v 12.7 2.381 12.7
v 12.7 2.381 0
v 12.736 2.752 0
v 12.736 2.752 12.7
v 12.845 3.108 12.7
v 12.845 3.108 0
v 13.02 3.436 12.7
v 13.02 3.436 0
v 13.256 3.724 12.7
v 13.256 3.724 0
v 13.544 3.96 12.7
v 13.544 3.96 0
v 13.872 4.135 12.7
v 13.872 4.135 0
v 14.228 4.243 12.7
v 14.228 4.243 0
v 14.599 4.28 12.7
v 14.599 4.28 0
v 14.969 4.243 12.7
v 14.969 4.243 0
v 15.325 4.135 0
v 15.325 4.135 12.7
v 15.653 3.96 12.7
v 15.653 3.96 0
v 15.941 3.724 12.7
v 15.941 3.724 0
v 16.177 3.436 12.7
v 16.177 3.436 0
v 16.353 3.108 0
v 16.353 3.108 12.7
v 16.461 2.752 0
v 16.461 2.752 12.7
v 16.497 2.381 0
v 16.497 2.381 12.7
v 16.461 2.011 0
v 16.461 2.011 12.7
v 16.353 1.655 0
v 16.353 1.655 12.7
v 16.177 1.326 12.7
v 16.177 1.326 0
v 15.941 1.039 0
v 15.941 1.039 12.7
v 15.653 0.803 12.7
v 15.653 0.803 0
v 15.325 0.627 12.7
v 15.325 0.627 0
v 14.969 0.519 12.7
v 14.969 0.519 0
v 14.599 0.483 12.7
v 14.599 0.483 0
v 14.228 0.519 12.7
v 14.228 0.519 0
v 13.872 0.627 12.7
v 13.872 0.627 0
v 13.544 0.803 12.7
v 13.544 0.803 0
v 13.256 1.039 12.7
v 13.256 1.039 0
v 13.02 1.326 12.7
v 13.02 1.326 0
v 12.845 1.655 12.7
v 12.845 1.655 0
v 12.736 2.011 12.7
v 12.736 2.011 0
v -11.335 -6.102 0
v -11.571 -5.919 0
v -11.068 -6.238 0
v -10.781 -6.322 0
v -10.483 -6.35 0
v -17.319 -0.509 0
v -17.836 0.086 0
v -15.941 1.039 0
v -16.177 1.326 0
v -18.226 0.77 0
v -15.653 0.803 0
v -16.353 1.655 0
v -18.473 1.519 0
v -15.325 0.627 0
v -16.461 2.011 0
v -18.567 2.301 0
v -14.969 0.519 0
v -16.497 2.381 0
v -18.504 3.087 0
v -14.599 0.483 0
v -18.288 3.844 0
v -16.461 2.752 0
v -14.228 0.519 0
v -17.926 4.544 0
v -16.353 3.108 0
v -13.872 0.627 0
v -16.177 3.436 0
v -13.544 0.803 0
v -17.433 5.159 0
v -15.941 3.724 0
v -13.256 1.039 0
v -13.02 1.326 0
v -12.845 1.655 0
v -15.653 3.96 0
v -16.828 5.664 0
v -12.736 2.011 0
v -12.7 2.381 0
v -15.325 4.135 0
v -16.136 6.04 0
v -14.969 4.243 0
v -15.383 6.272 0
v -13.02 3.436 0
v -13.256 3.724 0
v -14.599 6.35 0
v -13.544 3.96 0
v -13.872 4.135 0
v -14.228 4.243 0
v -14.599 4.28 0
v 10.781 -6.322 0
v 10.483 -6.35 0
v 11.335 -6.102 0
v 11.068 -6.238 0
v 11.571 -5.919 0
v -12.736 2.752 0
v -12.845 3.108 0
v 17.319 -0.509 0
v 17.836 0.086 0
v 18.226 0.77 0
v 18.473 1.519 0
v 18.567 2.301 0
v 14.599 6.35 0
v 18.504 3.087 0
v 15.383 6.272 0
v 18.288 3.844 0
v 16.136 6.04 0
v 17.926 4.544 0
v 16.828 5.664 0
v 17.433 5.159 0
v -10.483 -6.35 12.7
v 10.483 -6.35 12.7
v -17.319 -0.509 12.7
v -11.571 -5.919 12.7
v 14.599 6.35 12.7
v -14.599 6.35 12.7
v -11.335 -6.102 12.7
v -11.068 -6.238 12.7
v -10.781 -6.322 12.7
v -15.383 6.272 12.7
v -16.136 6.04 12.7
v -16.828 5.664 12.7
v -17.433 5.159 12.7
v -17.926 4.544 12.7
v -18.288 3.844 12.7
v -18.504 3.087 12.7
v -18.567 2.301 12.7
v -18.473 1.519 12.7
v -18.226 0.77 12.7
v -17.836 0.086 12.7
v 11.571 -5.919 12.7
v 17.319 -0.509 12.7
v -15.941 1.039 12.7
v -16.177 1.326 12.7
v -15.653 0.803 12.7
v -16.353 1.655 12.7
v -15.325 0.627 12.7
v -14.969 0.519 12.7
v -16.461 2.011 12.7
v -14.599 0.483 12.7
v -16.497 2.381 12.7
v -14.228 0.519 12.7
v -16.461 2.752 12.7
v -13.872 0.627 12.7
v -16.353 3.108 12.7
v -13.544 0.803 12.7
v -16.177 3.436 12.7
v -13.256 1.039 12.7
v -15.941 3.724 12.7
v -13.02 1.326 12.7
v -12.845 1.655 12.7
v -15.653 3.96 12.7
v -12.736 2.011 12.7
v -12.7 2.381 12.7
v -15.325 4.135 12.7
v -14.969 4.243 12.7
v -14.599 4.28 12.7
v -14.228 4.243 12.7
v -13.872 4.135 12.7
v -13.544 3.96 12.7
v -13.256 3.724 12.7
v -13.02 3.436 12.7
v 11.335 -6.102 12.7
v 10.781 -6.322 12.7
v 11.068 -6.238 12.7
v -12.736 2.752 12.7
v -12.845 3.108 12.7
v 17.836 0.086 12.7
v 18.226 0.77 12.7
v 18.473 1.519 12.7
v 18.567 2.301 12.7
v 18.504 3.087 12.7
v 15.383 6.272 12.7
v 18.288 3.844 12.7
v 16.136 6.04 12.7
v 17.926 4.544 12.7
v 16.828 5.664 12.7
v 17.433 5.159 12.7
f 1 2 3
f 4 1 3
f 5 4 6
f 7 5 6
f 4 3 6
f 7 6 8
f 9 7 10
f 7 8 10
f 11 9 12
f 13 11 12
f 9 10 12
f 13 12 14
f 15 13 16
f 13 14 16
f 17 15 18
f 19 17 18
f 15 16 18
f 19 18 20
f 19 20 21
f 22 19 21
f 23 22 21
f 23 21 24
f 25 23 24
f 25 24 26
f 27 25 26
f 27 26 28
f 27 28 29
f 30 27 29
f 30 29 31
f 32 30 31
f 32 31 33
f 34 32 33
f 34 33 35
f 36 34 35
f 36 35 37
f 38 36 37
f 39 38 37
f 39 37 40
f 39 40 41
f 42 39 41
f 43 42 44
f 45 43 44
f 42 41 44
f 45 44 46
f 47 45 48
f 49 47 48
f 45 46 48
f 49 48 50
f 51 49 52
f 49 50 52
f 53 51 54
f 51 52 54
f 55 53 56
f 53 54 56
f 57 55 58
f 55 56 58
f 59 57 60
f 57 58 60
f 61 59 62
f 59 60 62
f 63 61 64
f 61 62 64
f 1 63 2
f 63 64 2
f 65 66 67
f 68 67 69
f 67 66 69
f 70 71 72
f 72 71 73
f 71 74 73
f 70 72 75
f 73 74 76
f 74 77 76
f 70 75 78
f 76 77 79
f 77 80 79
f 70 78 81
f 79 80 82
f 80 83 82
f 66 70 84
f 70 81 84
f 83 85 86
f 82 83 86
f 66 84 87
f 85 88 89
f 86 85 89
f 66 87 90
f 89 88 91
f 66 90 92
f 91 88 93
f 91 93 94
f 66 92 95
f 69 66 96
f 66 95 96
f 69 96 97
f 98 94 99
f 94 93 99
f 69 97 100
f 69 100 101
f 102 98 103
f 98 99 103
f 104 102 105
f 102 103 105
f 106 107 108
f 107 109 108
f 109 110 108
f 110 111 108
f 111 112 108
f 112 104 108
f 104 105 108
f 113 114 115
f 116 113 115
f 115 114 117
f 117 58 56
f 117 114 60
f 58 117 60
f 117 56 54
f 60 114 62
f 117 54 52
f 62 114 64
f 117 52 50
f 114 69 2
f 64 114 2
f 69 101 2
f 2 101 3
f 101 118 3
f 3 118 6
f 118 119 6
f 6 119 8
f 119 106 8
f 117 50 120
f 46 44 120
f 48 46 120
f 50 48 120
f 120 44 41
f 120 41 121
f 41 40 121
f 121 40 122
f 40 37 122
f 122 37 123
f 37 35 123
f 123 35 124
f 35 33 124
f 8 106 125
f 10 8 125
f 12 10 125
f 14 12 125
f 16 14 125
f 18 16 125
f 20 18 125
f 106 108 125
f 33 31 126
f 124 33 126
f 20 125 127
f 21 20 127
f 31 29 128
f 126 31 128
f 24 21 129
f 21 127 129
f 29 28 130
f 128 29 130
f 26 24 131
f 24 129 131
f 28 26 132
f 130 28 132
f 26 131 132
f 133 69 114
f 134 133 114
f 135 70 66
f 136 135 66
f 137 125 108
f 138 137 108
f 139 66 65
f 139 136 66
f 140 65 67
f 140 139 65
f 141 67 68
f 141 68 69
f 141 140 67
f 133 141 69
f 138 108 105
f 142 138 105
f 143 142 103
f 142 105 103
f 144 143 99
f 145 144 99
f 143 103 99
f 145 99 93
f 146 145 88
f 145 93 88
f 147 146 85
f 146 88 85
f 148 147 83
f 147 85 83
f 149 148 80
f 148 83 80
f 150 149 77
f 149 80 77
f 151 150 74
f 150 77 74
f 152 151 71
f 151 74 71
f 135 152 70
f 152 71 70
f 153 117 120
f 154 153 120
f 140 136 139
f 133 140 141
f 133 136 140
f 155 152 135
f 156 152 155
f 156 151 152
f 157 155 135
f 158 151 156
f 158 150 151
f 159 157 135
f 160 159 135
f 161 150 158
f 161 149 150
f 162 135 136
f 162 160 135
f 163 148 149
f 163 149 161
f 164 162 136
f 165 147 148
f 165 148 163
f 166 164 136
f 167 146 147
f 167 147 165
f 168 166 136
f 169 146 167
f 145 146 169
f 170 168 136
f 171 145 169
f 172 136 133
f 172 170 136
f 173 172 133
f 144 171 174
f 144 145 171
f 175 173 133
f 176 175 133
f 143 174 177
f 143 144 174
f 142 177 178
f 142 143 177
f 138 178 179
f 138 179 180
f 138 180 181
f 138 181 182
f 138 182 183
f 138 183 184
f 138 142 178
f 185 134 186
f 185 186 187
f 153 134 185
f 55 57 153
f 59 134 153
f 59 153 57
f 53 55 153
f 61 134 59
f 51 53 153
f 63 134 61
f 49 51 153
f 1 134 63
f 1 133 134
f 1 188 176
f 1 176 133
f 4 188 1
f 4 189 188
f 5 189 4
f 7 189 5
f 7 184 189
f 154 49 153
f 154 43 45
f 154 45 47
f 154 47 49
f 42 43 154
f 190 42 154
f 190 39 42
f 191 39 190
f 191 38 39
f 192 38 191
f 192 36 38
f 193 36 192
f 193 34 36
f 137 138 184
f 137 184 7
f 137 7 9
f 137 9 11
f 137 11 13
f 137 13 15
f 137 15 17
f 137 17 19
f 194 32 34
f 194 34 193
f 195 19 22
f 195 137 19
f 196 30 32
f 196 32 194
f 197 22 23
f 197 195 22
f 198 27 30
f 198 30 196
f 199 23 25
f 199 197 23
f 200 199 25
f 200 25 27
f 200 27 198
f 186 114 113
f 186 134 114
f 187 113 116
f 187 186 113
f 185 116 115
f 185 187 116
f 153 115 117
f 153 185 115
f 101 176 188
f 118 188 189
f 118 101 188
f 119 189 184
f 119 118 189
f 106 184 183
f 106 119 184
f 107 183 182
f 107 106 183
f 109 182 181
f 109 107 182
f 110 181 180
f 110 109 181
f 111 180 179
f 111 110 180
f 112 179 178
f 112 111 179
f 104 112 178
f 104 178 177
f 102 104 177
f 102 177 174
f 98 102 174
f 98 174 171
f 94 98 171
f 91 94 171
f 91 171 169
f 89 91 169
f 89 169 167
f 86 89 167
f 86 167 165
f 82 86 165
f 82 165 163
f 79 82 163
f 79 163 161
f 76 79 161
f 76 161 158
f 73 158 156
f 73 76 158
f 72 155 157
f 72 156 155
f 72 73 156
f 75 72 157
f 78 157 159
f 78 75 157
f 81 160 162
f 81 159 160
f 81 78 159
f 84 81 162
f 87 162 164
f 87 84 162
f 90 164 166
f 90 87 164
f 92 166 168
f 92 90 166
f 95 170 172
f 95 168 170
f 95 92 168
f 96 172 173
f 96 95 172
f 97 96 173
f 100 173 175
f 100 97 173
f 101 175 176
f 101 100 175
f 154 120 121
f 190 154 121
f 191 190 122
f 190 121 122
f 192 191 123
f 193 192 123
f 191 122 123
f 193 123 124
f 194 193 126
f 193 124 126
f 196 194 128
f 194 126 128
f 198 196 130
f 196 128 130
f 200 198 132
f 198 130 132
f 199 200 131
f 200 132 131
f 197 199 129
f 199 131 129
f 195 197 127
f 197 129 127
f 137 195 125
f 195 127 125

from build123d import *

# Parameters (mm, degrees)
SKETCH1_R             = 1.89865
BOSS_EXTRUDE1_DEPTH   = 12.7
FILLET1_R             = 1.5875
F_6_CLEARANCE_HOLE1_D = 3.7973


with BuildPart() as part:
    # Sketch1 → Boss-Extrude1 (new body)
    with BuildSketch(Plane.XY):
        with BuildLine():
            Line((-17.318712187, -0.508773921), (-11.1125, -6.35))
            Line((-11.1125, -6.35), (11.1125, -6.35))
            Line((11.1125, -6.35), (17.318712187, -0.508773921))
            ThreePointArc((17.318712187, -0.508773921), (18.287874783, 3.844327942), (14.59865, 6.35))
            Line((14.59865, 6.35), (12.7, 6.35))
            Line((12.7, 6.35), (-12.7, 6.35))
            Line((-12.7, 6.35), (-14.59865, 6.35))
            ThreePointArc((-14.59865, 6.35), (-18.287874783, 3.844327942), (-17.318712187, -0.508773921))
        make_face()
        with Locations((-14.59865, 2.38125)):
            Circle(SKETCH1_R, mode=Mode.SUBTRACT)
    extrude(amount=BOSS_EXTRUDE1_DEPTH)

    # Fillet1
    fillet1_edges = [part.edges().sort_by_distance(p)[0] for p in [
        (11.1125, -6.35, 6.35),
        (-11.1125, -6.35, 6.35),
    ]]
    fillet(fillet1_edges, radius=FILLET1_R)

    # #6 Clearance Hole1 (through all)
    with Locations(Plane.XY.offset(12.7)):
        with Locations((-14.59865, 2.38125), (14.59865, 2.38125)):
            Hole(F_6_CLEARANCE_HOLE1_D / 2)


solid = part.part
